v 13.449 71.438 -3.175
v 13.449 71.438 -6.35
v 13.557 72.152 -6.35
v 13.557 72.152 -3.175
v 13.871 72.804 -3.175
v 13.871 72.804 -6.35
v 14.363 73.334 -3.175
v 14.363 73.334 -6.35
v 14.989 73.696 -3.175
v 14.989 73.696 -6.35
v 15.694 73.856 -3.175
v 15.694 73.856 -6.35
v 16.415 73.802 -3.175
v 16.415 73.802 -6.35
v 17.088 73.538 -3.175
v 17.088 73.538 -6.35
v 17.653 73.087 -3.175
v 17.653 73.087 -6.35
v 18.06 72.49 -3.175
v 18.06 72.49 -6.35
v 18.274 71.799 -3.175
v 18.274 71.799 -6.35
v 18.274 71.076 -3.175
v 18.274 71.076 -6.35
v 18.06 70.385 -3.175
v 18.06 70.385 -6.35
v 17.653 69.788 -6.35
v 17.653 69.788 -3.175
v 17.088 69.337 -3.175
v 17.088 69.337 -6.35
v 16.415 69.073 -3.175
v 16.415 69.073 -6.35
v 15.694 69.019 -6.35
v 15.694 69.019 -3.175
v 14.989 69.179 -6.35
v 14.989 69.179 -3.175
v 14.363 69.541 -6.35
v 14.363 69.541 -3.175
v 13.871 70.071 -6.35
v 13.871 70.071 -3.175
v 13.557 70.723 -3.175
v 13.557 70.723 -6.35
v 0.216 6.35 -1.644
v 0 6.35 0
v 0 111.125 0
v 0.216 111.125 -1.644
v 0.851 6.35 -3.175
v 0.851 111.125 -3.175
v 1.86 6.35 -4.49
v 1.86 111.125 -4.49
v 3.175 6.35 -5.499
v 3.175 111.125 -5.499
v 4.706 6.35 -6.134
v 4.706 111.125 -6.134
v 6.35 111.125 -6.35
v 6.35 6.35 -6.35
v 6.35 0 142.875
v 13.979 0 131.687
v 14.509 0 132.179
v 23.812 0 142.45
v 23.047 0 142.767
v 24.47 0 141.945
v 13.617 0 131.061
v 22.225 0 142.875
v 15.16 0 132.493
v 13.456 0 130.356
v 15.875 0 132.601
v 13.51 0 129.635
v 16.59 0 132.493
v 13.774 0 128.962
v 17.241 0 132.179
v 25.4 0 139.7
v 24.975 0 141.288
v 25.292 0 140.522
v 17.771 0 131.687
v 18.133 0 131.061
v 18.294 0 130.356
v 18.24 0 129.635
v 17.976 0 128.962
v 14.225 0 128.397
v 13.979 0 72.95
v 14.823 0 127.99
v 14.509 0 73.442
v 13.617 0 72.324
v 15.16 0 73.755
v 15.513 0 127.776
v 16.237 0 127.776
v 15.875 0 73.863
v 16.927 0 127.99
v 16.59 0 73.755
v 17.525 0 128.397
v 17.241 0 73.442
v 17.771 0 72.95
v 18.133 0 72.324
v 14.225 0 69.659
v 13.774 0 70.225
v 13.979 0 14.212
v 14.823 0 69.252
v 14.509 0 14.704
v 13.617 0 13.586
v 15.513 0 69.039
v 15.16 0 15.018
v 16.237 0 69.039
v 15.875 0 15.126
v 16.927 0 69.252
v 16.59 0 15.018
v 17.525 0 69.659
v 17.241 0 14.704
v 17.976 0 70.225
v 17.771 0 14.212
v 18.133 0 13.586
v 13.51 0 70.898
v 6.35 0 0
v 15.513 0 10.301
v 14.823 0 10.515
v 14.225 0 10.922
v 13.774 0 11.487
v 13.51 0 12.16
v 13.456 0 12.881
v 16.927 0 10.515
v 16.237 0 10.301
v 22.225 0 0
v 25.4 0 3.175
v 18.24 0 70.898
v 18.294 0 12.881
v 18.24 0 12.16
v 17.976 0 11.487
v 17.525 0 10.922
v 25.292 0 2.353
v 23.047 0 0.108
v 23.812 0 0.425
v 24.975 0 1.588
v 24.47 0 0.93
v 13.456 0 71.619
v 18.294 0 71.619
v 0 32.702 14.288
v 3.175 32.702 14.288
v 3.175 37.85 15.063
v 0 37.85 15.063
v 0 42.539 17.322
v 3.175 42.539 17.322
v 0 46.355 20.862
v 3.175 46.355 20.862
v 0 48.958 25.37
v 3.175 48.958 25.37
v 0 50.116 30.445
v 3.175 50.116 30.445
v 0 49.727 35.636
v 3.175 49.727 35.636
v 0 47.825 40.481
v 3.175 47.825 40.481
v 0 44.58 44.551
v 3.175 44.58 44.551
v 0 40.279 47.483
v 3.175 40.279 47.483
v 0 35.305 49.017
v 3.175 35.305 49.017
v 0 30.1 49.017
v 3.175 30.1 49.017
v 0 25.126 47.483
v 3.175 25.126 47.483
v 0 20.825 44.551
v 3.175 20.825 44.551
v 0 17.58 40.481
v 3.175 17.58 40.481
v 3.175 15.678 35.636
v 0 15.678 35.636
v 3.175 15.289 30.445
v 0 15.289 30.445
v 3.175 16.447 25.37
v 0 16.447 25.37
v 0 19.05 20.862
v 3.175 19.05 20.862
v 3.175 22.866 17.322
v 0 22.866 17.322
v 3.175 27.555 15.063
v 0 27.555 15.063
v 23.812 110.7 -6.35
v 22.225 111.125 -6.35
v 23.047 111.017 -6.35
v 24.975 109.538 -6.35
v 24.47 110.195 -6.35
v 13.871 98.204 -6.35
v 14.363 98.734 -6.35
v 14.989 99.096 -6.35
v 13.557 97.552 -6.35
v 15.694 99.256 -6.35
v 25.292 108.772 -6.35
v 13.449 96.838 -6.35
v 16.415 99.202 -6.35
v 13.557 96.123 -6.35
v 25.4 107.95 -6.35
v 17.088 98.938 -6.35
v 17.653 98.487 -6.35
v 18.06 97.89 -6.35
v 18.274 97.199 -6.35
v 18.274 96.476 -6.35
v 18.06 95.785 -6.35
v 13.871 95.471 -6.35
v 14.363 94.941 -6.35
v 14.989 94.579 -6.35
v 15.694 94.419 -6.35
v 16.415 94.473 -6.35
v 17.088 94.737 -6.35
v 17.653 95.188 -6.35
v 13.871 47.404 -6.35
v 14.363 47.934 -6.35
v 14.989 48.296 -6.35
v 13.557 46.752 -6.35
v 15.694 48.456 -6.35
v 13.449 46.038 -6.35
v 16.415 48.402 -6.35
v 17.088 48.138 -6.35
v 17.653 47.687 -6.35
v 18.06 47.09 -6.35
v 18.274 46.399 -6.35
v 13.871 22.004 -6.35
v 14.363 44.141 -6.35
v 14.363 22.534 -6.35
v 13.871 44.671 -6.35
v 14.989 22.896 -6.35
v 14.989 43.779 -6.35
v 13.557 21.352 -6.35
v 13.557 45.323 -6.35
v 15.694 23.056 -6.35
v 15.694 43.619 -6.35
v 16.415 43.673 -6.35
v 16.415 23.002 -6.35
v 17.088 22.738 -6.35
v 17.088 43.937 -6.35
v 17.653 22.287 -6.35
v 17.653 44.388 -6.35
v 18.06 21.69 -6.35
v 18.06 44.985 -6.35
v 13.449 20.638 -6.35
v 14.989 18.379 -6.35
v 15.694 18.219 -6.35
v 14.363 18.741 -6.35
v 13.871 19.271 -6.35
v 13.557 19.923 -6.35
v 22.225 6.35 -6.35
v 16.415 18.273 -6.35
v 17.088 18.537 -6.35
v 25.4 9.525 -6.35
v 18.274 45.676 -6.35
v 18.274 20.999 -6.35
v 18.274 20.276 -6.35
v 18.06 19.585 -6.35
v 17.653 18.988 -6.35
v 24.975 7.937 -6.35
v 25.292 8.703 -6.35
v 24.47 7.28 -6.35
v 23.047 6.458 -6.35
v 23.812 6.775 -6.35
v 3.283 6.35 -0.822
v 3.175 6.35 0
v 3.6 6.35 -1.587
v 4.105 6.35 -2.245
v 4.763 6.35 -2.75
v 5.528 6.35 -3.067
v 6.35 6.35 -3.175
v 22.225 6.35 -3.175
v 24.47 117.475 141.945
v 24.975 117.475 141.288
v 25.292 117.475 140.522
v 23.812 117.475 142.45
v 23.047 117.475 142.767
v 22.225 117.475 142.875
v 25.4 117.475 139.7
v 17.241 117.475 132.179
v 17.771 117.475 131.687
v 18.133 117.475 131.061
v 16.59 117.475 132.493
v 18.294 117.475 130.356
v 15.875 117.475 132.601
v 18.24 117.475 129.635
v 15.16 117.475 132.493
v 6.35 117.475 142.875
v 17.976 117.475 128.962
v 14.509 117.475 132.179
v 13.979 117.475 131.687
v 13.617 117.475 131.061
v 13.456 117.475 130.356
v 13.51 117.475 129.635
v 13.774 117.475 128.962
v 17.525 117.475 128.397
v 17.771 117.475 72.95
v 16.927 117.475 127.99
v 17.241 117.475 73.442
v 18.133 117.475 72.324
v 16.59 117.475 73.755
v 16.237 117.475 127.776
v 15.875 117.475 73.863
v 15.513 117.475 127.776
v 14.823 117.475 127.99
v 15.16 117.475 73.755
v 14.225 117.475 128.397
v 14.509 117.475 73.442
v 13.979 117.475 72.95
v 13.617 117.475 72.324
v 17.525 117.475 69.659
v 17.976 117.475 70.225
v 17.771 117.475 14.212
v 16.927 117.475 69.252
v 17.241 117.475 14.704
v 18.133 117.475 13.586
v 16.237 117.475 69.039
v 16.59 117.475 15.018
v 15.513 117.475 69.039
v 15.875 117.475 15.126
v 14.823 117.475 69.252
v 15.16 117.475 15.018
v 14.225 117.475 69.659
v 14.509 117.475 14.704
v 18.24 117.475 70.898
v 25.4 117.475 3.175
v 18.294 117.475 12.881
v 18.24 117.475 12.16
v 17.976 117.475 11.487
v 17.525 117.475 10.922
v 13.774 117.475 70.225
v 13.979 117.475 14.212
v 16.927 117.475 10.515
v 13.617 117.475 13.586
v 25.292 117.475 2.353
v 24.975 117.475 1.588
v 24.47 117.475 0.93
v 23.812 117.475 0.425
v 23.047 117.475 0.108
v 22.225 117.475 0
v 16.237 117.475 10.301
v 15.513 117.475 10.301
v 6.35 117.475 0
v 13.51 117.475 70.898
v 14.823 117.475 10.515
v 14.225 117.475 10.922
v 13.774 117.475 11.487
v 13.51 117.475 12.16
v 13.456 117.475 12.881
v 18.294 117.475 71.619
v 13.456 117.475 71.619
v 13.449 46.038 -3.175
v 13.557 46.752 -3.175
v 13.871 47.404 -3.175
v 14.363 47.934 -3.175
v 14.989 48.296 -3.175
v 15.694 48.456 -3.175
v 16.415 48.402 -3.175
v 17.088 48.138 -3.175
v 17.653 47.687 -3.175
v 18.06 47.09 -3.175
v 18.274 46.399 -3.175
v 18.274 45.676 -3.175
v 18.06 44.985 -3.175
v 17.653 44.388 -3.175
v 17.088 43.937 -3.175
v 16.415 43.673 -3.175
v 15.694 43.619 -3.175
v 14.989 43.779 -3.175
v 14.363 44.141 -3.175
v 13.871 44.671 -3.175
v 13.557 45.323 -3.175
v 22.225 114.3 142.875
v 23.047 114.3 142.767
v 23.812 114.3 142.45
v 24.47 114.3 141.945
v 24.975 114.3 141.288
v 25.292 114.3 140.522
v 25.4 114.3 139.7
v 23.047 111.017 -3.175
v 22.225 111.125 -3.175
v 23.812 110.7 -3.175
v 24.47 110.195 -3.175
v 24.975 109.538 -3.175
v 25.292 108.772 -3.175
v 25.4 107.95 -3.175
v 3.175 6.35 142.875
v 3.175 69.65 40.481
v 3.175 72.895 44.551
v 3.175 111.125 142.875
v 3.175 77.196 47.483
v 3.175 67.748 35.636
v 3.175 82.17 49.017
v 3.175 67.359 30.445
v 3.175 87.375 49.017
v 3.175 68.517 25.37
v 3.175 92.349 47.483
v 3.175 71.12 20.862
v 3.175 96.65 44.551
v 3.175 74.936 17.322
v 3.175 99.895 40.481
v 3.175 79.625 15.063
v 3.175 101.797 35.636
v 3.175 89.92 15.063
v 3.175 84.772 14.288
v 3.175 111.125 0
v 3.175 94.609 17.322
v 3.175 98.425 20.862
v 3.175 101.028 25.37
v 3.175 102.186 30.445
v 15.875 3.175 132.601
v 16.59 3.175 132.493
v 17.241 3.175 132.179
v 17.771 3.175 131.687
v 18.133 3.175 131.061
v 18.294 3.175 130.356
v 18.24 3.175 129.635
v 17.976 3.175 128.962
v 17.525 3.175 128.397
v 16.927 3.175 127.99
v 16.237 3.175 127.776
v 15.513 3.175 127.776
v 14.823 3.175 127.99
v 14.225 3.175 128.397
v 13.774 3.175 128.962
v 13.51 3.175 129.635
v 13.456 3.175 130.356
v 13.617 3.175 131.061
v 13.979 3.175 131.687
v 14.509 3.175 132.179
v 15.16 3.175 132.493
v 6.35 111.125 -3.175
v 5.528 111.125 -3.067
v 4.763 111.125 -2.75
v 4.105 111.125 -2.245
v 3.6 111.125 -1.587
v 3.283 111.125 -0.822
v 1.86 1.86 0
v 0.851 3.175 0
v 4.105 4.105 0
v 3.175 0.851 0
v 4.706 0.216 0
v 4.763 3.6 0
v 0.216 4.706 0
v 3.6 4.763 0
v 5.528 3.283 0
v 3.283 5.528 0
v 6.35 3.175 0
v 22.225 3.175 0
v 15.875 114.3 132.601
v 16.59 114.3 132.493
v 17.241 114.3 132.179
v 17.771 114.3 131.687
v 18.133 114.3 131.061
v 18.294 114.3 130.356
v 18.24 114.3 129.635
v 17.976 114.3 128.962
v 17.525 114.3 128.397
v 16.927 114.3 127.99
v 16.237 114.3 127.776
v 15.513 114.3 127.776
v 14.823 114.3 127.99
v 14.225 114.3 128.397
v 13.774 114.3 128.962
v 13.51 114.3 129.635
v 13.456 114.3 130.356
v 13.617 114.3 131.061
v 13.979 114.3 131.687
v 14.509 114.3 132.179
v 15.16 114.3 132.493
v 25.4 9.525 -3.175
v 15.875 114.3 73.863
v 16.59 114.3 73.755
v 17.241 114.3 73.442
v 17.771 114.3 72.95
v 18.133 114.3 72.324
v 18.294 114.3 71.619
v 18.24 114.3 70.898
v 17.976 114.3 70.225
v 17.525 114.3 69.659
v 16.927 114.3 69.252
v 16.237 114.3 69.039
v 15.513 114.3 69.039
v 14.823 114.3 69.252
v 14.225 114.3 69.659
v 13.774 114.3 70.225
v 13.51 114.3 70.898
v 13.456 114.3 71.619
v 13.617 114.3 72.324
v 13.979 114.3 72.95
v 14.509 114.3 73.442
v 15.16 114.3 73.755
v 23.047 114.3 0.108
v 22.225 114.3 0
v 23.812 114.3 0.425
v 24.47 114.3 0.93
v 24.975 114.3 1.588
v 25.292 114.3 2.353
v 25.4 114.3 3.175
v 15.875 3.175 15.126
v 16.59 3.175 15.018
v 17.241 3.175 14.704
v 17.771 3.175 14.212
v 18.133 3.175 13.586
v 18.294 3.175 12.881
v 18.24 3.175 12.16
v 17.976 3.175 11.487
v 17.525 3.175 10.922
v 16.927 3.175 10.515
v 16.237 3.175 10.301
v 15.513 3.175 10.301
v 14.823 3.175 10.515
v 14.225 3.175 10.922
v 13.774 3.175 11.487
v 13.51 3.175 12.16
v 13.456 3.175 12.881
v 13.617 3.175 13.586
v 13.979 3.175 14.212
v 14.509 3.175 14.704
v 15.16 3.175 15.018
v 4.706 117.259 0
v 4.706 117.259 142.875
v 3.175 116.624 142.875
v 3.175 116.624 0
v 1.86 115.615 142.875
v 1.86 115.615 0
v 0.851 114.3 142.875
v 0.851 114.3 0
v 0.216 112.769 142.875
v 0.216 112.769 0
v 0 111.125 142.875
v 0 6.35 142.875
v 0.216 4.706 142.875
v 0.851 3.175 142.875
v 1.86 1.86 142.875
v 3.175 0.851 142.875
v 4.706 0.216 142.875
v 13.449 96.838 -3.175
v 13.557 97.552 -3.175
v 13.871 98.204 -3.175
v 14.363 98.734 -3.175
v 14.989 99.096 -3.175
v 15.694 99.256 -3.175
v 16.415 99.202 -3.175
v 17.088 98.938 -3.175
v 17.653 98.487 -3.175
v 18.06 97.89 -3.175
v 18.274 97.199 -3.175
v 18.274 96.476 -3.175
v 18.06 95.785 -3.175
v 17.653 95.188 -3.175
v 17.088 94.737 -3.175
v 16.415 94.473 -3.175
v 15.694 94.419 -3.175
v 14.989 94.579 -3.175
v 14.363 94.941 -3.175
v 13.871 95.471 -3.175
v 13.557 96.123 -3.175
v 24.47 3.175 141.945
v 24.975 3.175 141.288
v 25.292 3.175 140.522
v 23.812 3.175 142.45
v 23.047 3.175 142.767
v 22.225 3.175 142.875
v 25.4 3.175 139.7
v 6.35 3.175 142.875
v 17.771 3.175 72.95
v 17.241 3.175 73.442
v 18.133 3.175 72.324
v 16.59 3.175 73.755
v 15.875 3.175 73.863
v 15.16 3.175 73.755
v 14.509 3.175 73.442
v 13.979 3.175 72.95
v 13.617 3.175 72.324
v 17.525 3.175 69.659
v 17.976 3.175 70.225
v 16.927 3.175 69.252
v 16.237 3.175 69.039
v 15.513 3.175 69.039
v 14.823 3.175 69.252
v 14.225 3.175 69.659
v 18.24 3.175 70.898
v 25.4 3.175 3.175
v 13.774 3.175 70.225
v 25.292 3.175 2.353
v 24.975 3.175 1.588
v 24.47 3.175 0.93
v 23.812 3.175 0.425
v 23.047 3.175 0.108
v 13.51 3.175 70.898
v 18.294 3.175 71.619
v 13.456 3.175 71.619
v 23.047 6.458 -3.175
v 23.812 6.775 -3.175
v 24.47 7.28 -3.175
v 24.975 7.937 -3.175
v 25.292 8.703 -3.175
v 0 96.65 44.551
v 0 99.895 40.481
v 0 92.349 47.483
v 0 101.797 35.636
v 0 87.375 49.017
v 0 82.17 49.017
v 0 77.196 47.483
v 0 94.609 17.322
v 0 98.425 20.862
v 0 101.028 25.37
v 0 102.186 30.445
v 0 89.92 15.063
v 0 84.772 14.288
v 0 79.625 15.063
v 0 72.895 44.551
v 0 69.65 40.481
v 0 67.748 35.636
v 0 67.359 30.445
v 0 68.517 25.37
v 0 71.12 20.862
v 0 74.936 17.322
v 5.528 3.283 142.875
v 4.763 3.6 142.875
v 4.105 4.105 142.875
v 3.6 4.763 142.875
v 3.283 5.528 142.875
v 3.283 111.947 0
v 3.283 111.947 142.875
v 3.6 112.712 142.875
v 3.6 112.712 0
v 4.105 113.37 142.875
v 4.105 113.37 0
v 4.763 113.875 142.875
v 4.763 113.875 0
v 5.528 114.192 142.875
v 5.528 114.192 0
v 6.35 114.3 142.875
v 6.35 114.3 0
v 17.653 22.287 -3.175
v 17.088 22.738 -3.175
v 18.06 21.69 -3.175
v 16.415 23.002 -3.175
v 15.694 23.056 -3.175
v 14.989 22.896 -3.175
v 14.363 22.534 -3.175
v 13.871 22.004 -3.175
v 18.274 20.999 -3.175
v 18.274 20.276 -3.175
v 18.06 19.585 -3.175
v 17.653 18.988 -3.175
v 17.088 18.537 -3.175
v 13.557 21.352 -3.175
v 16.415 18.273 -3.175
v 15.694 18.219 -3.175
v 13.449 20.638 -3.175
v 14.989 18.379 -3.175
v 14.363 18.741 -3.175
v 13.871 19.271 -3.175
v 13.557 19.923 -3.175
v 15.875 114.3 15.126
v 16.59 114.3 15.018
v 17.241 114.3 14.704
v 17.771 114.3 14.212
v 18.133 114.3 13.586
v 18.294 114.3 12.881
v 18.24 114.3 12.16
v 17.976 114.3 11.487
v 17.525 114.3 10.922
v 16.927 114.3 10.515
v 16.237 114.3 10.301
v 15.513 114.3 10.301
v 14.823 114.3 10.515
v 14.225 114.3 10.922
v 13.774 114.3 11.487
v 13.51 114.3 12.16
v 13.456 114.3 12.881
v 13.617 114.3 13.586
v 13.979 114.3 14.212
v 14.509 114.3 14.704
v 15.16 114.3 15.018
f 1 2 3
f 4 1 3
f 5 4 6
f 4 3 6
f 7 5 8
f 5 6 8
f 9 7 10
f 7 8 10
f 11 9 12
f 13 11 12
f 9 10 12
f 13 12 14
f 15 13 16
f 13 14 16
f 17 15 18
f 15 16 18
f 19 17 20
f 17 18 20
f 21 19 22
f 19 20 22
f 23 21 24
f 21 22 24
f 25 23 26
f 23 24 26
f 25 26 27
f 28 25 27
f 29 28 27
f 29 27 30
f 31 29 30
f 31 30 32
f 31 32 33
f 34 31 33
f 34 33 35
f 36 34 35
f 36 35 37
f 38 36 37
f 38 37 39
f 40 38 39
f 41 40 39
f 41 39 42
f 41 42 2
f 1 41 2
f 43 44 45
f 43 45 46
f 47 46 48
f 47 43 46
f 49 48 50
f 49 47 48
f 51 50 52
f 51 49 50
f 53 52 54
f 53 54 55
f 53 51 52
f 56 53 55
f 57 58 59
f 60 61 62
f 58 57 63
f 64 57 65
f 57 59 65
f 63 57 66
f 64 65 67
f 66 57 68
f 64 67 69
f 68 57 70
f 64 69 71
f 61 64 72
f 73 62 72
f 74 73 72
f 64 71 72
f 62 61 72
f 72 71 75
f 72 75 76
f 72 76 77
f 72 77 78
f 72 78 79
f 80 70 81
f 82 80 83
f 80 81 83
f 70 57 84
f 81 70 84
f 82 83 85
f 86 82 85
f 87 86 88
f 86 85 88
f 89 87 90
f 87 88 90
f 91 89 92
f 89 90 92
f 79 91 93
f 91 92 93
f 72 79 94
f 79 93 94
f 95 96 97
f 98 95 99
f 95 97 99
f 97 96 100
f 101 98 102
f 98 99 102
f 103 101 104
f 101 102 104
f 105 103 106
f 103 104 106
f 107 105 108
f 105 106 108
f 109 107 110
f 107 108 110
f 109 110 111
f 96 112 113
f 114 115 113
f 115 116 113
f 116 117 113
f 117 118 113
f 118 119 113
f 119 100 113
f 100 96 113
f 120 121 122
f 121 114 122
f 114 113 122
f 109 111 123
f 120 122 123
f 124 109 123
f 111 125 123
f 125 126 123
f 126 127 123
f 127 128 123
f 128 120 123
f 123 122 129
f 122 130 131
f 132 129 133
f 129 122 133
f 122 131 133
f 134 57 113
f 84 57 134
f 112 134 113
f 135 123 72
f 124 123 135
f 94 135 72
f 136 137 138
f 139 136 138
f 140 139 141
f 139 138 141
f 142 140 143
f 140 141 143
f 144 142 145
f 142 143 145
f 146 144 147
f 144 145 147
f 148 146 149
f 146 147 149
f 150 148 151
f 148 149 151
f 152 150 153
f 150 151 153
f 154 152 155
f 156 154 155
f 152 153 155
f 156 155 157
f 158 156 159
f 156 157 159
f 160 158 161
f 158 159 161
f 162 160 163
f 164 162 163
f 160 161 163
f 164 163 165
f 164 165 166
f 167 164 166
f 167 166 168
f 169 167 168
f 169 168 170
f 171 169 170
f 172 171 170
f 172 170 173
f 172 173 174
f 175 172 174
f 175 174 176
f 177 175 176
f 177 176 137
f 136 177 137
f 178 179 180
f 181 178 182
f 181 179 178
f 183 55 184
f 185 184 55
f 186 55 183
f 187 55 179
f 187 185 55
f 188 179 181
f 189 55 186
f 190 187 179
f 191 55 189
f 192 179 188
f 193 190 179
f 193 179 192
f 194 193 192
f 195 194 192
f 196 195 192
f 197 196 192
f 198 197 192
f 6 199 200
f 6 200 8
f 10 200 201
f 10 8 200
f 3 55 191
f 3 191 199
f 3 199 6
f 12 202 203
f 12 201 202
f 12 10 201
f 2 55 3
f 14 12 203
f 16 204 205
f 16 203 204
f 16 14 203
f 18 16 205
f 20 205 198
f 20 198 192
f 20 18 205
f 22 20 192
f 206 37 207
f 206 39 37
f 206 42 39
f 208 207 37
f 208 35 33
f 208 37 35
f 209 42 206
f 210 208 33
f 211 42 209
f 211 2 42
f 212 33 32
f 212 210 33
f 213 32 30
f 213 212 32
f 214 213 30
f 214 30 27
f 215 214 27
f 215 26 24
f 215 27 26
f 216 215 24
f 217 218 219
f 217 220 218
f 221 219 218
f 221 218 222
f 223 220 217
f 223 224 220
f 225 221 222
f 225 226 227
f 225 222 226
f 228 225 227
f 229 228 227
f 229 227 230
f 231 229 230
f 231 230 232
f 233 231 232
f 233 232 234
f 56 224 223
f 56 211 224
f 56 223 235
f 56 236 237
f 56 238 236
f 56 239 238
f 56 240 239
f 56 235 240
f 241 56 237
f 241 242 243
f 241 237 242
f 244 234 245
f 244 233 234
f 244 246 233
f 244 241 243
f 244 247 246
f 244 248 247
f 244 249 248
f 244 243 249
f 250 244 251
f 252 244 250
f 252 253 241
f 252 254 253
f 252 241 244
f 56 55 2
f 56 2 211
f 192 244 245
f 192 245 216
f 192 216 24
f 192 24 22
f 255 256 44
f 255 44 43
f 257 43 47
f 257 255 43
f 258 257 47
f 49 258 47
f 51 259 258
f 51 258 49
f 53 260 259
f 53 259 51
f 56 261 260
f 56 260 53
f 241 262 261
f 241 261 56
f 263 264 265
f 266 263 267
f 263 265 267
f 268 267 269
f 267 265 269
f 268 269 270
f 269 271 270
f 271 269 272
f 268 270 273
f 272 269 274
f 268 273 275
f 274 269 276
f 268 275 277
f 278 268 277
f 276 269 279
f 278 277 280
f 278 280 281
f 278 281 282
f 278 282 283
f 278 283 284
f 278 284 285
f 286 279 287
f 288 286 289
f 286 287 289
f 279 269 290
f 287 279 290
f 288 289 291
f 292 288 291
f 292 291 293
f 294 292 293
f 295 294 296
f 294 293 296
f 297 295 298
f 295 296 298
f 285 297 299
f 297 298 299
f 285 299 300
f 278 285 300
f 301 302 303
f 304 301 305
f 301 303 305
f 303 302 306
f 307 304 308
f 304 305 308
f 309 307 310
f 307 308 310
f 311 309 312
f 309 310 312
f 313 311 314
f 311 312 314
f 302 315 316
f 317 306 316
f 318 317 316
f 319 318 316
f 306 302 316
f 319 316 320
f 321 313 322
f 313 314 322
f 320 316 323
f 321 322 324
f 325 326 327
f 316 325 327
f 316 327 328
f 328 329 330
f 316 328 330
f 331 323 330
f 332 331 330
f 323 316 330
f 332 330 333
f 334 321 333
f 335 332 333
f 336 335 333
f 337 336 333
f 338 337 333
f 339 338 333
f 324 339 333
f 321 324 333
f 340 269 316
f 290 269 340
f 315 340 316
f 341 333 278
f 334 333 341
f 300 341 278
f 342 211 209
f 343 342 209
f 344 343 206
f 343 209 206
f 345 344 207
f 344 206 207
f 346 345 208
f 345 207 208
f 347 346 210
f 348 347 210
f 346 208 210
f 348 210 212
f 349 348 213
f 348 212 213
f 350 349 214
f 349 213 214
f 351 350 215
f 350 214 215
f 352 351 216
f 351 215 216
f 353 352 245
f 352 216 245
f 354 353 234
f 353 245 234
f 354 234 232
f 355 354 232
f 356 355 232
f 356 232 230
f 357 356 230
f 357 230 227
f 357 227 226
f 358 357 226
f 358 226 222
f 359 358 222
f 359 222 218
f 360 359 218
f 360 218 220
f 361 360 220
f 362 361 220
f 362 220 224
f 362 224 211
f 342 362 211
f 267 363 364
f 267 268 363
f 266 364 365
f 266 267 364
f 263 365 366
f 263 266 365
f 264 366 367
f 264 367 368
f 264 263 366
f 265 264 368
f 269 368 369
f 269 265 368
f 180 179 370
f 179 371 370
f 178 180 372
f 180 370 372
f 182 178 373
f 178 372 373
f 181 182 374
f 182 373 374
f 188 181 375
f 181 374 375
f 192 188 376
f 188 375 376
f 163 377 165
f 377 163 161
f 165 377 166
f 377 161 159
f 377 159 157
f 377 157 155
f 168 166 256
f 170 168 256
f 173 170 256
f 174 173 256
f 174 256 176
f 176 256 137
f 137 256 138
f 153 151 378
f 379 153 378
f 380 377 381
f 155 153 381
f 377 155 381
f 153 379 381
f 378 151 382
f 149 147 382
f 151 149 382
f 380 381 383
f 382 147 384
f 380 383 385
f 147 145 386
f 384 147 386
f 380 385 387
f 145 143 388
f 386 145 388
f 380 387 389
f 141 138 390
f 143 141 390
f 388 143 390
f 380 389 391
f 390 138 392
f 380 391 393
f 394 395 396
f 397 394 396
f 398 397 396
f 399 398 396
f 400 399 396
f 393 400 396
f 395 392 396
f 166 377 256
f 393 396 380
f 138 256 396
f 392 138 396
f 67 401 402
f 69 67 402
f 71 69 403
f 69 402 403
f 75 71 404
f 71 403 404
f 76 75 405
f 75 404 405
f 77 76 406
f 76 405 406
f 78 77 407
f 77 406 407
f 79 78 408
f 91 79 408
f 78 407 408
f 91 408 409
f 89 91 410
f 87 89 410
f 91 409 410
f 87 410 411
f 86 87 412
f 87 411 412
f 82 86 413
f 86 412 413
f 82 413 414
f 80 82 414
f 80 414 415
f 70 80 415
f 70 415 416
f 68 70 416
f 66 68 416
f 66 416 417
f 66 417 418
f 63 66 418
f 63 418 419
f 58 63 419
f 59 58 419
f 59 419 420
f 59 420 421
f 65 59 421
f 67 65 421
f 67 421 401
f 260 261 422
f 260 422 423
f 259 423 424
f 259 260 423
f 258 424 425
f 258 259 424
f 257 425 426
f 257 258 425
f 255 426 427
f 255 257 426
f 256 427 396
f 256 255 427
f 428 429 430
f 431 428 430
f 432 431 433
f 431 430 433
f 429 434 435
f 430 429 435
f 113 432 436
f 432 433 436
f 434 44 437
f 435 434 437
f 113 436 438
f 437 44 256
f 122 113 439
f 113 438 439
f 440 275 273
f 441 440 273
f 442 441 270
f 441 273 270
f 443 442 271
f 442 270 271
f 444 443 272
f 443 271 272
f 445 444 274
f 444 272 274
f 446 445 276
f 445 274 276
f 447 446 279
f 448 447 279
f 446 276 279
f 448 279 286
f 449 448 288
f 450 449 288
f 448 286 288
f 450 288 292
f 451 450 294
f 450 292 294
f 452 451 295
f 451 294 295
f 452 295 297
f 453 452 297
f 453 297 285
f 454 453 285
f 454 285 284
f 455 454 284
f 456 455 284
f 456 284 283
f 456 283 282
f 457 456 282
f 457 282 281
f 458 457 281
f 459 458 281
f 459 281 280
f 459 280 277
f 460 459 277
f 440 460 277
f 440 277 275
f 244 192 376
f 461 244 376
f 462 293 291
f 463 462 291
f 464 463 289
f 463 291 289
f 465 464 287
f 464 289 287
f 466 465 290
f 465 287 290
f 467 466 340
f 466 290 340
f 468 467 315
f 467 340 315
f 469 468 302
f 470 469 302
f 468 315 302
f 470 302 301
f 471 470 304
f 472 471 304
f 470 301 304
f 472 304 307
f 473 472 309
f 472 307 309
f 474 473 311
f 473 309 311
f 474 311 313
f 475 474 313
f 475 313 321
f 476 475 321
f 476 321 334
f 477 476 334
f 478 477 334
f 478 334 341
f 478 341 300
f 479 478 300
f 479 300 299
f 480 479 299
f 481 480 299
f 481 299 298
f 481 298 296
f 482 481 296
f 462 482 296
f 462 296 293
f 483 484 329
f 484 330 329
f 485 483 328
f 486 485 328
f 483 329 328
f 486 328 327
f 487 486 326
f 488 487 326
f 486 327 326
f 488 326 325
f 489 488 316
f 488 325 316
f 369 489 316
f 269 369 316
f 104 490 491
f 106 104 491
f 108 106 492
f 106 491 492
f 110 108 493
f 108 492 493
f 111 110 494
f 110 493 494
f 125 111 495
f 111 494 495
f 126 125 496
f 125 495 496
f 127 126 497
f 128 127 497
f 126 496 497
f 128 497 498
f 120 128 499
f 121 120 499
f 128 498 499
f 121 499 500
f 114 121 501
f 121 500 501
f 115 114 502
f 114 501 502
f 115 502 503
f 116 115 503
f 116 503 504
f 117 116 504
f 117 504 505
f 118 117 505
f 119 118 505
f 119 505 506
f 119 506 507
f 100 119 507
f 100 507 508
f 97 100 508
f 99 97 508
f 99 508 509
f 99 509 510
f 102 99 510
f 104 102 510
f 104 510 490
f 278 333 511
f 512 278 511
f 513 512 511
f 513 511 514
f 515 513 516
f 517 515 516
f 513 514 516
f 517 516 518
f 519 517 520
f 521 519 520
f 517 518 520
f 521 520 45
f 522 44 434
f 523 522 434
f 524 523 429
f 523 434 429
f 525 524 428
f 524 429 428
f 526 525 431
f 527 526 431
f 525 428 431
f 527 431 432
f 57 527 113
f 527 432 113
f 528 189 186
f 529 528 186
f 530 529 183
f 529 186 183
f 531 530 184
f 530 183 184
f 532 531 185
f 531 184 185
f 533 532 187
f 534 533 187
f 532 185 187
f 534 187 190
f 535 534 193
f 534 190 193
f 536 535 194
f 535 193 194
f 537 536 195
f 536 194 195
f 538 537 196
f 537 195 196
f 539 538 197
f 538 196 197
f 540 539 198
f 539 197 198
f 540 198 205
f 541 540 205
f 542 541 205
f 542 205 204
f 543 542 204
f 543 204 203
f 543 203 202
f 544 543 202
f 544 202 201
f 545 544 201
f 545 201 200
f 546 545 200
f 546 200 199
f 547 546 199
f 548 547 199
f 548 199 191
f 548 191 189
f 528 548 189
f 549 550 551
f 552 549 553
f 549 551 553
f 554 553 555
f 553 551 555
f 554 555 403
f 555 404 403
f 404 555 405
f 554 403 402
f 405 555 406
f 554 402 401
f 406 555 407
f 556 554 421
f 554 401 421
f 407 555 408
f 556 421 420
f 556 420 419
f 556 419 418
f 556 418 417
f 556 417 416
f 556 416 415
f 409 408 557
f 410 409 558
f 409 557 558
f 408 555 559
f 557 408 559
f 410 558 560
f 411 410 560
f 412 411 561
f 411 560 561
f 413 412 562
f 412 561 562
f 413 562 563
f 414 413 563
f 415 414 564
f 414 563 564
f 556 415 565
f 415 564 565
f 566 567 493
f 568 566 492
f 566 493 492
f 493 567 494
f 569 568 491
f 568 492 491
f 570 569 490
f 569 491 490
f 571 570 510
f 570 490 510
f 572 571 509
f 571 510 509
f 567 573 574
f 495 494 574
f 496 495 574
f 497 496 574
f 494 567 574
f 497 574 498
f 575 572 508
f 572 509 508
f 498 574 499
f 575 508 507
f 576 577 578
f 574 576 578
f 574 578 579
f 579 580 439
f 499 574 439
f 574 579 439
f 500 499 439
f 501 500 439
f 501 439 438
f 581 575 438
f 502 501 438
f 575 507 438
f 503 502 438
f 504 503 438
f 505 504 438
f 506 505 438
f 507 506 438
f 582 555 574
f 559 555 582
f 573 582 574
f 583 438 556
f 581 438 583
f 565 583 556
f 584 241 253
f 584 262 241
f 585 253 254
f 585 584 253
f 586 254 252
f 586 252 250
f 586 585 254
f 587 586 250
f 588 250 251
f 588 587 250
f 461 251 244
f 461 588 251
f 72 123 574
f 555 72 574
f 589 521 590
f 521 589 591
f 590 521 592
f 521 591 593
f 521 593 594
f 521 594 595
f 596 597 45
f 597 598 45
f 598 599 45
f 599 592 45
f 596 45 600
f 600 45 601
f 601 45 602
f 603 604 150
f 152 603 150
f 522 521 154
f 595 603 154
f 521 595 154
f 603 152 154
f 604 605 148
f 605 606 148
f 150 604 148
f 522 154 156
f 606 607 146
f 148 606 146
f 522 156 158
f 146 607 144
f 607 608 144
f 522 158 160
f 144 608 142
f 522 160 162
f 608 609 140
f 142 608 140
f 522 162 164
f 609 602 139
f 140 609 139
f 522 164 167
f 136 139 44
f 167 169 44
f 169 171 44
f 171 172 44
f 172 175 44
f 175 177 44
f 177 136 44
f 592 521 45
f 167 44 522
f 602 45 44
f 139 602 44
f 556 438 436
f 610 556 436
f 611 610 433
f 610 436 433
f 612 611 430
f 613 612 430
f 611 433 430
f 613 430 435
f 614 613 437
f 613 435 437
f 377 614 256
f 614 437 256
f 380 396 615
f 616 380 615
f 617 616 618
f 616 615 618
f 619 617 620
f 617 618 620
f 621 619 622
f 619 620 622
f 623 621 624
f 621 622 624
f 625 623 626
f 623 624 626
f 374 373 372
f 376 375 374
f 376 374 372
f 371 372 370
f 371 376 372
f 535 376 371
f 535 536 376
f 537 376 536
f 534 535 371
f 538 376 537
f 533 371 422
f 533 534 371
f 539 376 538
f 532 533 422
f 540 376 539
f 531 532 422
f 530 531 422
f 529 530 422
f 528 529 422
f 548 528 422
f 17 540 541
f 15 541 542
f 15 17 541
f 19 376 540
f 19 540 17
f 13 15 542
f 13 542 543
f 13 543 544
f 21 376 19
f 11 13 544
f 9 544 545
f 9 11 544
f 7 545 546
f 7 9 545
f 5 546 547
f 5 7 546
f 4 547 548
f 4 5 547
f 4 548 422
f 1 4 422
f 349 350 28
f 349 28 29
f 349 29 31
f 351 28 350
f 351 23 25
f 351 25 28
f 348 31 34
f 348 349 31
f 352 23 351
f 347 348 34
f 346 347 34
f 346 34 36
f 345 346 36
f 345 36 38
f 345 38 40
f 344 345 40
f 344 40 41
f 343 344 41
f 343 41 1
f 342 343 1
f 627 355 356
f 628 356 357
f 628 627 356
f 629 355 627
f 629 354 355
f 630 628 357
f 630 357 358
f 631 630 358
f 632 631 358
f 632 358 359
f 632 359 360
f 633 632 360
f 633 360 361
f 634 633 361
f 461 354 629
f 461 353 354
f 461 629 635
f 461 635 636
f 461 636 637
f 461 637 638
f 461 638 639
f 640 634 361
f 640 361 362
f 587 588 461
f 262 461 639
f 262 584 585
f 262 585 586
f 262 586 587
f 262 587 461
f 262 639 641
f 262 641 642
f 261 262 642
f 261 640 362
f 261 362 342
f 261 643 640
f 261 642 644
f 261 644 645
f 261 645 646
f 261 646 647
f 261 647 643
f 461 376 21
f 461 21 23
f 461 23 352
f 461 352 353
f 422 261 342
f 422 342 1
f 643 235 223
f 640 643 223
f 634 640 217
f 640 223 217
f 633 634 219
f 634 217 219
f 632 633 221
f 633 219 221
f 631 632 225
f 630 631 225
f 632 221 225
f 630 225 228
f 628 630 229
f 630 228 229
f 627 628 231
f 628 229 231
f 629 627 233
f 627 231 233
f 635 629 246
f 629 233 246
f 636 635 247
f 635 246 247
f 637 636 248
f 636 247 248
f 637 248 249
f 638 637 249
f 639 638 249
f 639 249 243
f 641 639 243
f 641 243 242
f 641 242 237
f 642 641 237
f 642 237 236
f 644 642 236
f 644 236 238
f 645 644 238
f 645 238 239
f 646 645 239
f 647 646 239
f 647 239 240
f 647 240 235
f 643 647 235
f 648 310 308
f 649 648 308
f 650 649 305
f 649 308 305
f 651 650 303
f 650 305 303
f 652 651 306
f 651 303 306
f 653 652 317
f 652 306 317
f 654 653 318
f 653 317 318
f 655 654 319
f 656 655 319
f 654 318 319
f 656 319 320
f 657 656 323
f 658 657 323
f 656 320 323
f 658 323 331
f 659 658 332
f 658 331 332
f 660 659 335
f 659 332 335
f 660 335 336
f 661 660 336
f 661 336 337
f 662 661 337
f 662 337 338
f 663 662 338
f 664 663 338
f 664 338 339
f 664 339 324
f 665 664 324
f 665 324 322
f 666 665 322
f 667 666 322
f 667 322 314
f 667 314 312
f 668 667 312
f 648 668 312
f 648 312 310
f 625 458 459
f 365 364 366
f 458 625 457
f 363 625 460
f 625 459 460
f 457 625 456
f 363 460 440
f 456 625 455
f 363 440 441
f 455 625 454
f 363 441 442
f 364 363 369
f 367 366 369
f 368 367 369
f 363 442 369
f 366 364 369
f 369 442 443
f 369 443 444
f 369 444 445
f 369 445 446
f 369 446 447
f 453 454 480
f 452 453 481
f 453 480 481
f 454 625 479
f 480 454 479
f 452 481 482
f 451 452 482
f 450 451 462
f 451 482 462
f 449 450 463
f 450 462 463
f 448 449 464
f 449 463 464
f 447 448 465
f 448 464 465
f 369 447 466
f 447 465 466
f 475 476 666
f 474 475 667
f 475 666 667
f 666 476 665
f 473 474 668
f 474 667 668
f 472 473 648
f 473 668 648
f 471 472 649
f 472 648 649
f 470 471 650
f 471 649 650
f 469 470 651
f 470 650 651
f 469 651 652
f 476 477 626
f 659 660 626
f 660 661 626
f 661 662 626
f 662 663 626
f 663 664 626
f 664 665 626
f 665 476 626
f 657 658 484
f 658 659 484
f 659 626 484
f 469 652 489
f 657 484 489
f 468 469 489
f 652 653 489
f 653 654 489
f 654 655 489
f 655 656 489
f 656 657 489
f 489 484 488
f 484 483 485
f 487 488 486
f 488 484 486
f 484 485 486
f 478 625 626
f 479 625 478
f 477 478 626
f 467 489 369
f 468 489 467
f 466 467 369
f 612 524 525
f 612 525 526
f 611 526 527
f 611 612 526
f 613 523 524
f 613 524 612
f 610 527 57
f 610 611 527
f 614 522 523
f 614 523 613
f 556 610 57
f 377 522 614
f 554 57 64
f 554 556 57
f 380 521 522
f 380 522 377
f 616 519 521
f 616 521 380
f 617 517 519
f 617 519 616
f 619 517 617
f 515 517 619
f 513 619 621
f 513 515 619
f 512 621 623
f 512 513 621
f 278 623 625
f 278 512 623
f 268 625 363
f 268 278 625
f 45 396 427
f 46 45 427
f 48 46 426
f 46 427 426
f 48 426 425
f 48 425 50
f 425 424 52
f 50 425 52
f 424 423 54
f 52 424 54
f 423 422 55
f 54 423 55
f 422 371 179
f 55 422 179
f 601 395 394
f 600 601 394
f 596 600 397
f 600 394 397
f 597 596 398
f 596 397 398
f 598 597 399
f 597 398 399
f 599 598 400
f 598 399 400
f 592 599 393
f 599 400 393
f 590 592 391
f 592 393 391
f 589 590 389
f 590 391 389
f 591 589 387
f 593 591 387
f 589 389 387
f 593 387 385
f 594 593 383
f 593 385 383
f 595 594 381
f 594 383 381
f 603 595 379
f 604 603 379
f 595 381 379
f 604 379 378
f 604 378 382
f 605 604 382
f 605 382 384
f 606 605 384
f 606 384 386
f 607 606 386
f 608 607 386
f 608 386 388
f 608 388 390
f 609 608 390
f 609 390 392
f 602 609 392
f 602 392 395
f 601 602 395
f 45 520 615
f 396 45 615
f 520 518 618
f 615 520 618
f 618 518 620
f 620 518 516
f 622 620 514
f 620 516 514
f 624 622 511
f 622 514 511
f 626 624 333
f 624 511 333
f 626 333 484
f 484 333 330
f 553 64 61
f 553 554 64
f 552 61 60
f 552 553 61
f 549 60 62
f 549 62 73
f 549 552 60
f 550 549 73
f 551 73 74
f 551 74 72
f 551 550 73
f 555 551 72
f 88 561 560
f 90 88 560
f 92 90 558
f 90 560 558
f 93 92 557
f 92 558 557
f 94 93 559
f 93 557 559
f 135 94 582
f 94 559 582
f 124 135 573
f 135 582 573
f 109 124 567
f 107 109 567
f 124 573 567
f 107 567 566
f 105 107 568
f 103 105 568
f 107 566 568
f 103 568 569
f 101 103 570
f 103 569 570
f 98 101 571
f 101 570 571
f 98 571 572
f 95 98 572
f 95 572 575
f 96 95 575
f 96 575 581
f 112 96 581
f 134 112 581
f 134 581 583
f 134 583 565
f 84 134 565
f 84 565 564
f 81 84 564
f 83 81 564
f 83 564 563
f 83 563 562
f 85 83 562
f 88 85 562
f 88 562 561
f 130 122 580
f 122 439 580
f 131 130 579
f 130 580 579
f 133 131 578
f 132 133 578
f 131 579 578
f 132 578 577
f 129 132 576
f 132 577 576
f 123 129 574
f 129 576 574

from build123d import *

# Parameters (mm, degrees)
BASE_FLANGE1_DEPTH = 142.875
EDGE_FLANGE1_DEPTH = 104.775
SKETCH9_R          = 17.4625
CUT_EXTRUDE1_DEPTH = 187.299736648
SKETCH10_R         = 2.4257
CUT_EXTRUDE2_DEPTH = 187.705118435
SKETCH11_R         = 2.4257
CUT_EXTRUDE3_DEPTH = 192.608027624
FILLET1_R          = 3.175


# Sheet-metal steps are written as plain solids
with BuildPart() as part:
    # Sketch1 → Base-Flange1 (new body)
    with BuildSketch(Plane.XY):
        with BuildLine():
            Line((25.4, 117.475), (6.35, 117.475))
            ThreePointArc((6.35, 117.475), (1.859871939, 115.615128061), (0, 111.125))
            Line((0, 111.125), (0, 6.35))
            ThreePointArc((0, 6.35), (1.859871939, 1.859871939), (6.35, 0))
            Line((6.35, 0), (25.4, 0))
            Line((25.4, 0), (25.4, 3.175))
            Line((25.4, 3.175), (6.35, 3.175))
            ThreePointArc((6.35, 3.175), (4.10493597, 4.10493597), (3.175, 6.35))
            Line((3.175, 6.35), (3.175, 111.125))
            ThreePointArc((3.175, 111.125), (4.10493597, 113.37006403), (6.35, 114.3))
            Line((6.35, 114.3), (25.4, 114.3))
            Line((25.4, 114.3), (25.4, 117.475))
        make_face()
    extrude(amount=BASE_FLANGE1_DEPTH)

    # Edge-Flange1 section (across the edge) → Edge-Flange1 (add)
    with BuildSketch(Plane(origin=(3.175, 6.35, -3.175), x_dir=(0, 0, 1), z_dir=(0, 1, 0))):
        with BuildLine():
            Line((-3.175, 3.175), (-3.175, 22.225))
            Line((-3.175, 22.225), (0, 22.225))
            Line((0, 22.225), (0, 3.175))
            ThreePointArc((0, 3.175), (0.92993597, 0.92993597), (3.175, 0))
            Line((3.175, 0), (3.175, -3.175))
            ThreePointArc((3.175, -3.175), (-1.315128061, -1.315128061), (-3.175, 3.175))
        make_face()
    extrude(amount=EDGE_FLANGE1_DEPTH)

    # Sketch9 → Cut-Extrude1 (cut, through all)
    with BuildSketch(Plane(origin=(3.175, 0, 0), x_dir=(0, 0, -1), z_dir=(1, 0, 0))):
        with Locations((-31.75, 84.7725)):
            Circle(SKETCH9_R)
        with Locations((-31.75, 32.7025)):
            Circle(SKETCH9_R)
    extrude(amount=-CUT_EXTRUDE1_DEPTH, mode=Mode.SUBTRACT)

    # Sketch10 → Cut-Extrude2 (cut, through all)
    with BuildSketch(Plane(origin=(0, 117.475, 0), x_dir=(1, 0, 0), z_dir=(0, 1, 0))):
        with Locations(Location((15.875, -71.4375, 0), (0, 0, 270))):
            Circle(SKETCH10_R)
        with Locations(Location((15.875, -130.175, 0), (0, 0, 270))):
            Circle(SKETCH10_R)
        with Locations(Location((15.875, -12.7, 0), (0, 0, 270))):
            Circle(SKETCH10_R)
    extrude(amount=-CUT_EXTRUDE2_DEPTH, mode=Mode.SUBTRACT)

    # Sketch11 → Cut-Extrude3 (cut, through all)
    with BuildSketch(Plane(origin=(0, 0, -6.35), x_dir=(-1, 0, 0), z_dir=(0, 0, -1))):
        with Locations((-15.875, 20.6375)):
            Circle(SKETCH11_R)
        with Locations((-15.875, 96.8375)):
            Circle(SKETCH11_R)
        with Locations((-15.875, 71.4375)):
            Circle(SKETCH11_R)
        with Locations((-15.875, 46.0375)):
            Circle(SKETCH11_R)
    extrude(amount=-CUT_EXTRUDE3_DEPTH, mode=Mode.SUBTRACT)

    # Fillet1
    fillet1_edges = [part.edges().sort_by_distance(p)[0] for p in [
        (25.4, 1.5875, 0),
        (25.4, 115.8875, 0),
        (25.4, 1.5875, 142.875),
        (25.4, 6.35, -4.7625),
        (25.4, 111.125, -4.7625),
        (25.4, 115.8875, 142.875),
    ]]
    fillet(fillet1_edges, radius=FILLET1_R)


solid = part.part
